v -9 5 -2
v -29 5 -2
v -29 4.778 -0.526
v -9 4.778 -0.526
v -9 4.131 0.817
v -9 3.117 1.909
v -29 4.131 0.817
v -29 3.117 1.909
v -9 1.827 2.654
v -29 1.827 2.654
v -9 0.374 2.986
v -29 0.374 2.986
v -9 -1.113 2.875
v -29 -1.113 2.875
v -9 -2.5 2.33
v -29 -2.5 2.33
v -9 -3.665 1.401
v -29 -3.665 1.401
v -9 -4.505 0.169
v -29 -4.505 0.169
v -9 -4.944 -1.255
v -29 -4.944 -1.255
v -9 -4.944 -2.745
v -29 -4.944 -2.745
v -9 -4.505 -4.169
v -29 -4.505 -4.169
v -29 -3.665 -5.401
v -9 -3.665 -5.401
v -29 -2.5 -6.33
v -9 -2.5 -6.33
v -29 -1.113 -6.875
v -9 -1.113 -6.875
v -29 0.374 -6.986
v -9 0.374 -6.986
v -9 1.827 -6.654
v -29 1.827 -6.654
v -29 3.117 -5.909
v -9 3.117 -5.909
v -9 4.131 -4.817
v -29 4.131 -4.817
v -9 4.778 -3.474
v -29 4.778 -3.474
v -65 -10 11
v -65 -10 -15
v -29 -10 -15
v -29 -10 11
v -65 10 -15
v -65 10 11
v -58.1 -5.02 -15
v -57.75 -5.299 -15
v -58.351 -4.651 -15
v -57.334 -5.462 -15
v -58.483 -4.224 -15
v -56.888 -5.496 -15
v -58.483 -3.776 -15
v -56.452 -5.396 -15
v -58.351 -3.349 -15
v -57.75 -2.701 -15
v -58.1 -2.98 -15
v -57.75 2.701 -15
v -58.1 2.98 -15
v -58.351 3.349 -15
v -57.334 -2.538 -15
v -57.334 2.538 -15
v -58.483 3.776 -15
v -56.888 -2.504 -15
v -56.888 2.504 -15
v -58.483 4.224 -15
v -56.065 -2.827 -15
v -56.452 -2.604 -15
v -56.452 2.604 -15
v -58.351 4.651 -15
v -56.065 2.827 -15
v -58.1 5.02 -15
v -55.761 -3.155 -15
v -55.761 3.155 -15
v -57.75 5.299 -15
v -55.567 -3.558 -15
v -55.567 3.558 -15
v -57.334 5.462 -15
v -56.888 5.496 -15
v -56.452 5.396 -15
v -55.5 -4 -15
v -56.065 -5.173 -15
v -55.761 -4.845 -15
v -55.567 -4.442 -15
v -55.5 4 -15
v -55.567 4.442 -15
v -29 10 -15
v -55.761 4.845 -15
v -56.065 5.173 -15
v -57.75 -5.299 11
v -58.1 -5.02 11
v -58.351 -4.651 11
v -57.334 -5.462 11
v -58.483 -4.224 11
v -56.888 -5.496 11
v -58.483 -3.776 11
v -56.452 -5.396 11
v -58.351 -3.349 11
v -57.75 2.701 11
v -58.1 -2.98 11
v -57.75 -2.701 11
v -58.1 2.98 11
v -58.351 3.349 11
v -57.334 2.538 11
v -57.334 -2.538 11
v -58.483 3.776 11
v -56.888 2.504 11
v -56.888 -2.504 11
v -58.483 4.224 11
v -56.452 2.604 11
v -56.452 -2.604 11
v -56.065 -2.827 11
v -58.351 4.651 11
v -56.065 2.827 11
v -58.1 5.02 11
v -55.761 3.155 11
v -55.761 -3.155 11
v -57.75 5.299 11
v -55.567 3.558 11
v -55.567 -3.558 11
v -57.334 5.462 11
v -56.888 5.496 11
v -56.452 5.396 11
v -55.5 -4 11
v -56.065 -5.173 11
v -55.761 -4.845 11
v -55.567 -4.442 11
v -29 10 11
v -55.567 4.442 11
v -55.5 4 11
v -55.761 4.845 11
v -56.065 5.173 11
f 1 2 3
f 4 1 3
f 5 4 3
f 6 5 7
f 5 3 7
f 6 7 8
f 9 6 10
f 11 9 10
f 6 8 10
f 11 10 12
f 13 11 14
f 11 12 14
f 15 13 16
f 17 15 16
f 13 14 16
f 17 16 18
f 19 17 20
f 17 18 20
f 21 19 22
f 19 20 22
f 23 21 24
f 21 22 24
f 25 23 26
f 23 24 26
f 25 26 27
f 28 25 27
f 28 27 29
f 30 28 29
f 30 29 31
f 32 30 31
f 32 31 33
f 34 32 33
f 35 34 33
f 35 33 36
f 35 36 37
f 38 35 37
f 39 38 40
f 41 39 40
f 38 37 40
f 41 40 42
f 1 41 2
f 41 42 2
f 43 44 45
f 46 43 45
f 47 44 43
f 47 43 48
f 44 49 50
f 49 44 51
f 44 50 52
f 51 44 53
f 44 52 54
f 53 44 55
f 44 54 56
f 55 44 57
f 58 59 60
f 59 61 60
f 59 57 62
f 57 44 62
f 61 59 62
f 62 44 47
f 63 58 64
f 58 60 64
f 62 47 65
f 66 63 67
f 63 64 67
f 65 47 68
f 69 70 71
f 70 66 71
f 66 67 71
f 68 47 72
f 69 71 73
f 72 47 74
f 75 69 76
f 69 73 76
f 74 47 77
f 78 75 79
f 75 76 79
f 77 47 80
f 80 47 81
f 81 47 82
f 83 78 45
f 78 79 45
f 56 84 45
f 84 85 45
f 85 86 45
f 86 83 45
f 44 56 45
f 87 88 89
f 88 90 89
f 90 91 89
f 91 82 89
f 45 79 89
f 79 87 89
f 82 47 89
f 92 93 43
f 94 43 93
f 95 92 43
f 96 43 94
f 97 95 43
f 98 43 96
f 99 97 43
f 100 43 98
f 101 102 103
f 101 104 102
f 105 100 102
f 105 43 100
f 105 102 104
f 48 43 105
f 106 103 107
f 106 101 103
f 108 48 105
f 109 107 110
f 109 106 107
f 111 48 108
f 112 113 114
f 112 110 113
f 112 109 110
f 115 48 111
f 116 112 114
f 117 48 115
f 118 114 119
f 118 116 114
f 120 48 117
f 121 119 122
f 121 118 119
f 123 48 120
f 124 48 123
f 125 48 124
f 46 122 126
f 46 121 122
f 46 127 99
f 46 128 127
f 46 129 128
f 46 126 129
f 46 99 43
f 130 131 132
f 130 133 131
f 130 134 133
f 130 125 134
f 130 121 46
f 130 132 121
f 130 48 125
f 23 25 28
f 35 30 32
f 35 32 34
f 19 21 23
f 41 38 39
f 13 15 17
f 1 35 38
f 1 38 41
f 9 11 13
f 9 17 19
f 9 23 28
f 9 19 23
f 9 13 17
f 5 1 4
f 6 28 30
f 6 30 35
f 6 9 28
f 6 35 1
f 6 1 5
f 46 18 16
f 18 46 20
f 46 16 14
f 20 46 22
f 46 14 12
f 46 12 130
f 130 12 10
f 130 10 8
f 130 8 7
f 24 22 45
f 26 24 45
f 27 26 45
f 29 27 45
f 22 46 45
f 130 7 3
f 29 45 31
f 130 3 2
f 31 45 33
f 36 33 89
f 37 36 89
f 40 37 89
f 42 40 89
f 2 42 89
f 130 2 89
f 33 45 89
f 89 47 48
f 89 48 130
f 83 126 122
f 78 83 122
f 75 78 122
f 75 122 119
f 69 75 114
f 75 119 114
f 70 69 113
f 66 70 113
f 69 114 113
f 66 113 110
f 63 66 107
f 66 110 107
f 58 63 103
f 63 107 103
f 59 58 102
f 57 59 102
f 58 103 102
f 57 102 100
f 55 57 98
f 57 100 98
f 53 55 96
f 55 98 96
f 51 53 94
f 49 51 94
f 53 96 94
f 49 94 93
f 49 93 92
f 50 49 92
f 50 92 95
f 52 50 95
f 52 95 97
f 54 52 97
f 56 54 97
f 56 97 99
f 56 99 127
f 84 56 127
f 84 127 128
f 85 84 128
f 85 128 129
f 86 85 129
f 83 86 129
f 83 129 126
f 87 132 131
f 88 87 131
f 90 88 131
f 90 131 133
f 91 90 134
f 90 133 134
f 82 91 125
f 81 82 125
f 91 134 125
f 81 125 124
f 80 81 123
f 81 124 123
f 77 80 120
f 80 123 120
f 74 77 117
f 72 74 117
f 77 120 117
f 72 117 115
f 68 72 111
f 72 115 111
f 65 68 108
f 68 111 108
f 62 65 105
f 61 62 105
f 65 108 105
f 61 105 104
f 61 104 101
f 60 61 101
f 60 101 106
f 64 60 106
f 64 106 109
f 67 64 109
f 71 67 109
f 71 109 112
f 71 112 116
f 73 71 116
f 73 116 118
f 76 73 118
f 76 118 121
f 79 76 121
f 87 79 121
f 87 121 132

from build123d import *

# Parameters (mm, degrees)
SKETCH119_W     = 36
SKETCH119_H     = 20
PAD083_DEPTH    = 26
SKETCH120_R     = 5
PAD084_DEPTH    = 20
SKETCH137_R     = 1.5
POCKET108_DEPTH = 26.001


with BuildPart() as part:
    # Sketch119 → Pad083 (new body)
    with BuildSketch(Plane.XY):
        with Locations((-46, 0)):
            Rectangle(SKETCH119_W, SKETCH119_H)
    extrude(amount=PAD083_DEPTH)

    # Sketch120 (on Face2 of Pad083) → Pad084 (join)
    with BuildSketch(Plane.YZ.offset(-28)):
        with Locations((0, 13)):
            Circle(SKETCH120_R)
    extrude(amount=PAD084_DEPTH)

    # Sketch137 (on Face5 of Pad084) → Pocket108 (cut, through all)
    with BuildSketch(Plane.XY.offset(26)):
        with Locations((-56, 4)):
            Circle(SKETCH137_R)
        with Locations((-56, -4)):
            Circle(SKETCH137_R)
    extrude(amount=-POCKET108_DEPTH, mode=Mode.SUBTRACT)


with BuildPart() as part_1:
    # Body049 placement: moved
    add(part.part.moved(Location((-1, 0, -15))))


solid = part_1.part
